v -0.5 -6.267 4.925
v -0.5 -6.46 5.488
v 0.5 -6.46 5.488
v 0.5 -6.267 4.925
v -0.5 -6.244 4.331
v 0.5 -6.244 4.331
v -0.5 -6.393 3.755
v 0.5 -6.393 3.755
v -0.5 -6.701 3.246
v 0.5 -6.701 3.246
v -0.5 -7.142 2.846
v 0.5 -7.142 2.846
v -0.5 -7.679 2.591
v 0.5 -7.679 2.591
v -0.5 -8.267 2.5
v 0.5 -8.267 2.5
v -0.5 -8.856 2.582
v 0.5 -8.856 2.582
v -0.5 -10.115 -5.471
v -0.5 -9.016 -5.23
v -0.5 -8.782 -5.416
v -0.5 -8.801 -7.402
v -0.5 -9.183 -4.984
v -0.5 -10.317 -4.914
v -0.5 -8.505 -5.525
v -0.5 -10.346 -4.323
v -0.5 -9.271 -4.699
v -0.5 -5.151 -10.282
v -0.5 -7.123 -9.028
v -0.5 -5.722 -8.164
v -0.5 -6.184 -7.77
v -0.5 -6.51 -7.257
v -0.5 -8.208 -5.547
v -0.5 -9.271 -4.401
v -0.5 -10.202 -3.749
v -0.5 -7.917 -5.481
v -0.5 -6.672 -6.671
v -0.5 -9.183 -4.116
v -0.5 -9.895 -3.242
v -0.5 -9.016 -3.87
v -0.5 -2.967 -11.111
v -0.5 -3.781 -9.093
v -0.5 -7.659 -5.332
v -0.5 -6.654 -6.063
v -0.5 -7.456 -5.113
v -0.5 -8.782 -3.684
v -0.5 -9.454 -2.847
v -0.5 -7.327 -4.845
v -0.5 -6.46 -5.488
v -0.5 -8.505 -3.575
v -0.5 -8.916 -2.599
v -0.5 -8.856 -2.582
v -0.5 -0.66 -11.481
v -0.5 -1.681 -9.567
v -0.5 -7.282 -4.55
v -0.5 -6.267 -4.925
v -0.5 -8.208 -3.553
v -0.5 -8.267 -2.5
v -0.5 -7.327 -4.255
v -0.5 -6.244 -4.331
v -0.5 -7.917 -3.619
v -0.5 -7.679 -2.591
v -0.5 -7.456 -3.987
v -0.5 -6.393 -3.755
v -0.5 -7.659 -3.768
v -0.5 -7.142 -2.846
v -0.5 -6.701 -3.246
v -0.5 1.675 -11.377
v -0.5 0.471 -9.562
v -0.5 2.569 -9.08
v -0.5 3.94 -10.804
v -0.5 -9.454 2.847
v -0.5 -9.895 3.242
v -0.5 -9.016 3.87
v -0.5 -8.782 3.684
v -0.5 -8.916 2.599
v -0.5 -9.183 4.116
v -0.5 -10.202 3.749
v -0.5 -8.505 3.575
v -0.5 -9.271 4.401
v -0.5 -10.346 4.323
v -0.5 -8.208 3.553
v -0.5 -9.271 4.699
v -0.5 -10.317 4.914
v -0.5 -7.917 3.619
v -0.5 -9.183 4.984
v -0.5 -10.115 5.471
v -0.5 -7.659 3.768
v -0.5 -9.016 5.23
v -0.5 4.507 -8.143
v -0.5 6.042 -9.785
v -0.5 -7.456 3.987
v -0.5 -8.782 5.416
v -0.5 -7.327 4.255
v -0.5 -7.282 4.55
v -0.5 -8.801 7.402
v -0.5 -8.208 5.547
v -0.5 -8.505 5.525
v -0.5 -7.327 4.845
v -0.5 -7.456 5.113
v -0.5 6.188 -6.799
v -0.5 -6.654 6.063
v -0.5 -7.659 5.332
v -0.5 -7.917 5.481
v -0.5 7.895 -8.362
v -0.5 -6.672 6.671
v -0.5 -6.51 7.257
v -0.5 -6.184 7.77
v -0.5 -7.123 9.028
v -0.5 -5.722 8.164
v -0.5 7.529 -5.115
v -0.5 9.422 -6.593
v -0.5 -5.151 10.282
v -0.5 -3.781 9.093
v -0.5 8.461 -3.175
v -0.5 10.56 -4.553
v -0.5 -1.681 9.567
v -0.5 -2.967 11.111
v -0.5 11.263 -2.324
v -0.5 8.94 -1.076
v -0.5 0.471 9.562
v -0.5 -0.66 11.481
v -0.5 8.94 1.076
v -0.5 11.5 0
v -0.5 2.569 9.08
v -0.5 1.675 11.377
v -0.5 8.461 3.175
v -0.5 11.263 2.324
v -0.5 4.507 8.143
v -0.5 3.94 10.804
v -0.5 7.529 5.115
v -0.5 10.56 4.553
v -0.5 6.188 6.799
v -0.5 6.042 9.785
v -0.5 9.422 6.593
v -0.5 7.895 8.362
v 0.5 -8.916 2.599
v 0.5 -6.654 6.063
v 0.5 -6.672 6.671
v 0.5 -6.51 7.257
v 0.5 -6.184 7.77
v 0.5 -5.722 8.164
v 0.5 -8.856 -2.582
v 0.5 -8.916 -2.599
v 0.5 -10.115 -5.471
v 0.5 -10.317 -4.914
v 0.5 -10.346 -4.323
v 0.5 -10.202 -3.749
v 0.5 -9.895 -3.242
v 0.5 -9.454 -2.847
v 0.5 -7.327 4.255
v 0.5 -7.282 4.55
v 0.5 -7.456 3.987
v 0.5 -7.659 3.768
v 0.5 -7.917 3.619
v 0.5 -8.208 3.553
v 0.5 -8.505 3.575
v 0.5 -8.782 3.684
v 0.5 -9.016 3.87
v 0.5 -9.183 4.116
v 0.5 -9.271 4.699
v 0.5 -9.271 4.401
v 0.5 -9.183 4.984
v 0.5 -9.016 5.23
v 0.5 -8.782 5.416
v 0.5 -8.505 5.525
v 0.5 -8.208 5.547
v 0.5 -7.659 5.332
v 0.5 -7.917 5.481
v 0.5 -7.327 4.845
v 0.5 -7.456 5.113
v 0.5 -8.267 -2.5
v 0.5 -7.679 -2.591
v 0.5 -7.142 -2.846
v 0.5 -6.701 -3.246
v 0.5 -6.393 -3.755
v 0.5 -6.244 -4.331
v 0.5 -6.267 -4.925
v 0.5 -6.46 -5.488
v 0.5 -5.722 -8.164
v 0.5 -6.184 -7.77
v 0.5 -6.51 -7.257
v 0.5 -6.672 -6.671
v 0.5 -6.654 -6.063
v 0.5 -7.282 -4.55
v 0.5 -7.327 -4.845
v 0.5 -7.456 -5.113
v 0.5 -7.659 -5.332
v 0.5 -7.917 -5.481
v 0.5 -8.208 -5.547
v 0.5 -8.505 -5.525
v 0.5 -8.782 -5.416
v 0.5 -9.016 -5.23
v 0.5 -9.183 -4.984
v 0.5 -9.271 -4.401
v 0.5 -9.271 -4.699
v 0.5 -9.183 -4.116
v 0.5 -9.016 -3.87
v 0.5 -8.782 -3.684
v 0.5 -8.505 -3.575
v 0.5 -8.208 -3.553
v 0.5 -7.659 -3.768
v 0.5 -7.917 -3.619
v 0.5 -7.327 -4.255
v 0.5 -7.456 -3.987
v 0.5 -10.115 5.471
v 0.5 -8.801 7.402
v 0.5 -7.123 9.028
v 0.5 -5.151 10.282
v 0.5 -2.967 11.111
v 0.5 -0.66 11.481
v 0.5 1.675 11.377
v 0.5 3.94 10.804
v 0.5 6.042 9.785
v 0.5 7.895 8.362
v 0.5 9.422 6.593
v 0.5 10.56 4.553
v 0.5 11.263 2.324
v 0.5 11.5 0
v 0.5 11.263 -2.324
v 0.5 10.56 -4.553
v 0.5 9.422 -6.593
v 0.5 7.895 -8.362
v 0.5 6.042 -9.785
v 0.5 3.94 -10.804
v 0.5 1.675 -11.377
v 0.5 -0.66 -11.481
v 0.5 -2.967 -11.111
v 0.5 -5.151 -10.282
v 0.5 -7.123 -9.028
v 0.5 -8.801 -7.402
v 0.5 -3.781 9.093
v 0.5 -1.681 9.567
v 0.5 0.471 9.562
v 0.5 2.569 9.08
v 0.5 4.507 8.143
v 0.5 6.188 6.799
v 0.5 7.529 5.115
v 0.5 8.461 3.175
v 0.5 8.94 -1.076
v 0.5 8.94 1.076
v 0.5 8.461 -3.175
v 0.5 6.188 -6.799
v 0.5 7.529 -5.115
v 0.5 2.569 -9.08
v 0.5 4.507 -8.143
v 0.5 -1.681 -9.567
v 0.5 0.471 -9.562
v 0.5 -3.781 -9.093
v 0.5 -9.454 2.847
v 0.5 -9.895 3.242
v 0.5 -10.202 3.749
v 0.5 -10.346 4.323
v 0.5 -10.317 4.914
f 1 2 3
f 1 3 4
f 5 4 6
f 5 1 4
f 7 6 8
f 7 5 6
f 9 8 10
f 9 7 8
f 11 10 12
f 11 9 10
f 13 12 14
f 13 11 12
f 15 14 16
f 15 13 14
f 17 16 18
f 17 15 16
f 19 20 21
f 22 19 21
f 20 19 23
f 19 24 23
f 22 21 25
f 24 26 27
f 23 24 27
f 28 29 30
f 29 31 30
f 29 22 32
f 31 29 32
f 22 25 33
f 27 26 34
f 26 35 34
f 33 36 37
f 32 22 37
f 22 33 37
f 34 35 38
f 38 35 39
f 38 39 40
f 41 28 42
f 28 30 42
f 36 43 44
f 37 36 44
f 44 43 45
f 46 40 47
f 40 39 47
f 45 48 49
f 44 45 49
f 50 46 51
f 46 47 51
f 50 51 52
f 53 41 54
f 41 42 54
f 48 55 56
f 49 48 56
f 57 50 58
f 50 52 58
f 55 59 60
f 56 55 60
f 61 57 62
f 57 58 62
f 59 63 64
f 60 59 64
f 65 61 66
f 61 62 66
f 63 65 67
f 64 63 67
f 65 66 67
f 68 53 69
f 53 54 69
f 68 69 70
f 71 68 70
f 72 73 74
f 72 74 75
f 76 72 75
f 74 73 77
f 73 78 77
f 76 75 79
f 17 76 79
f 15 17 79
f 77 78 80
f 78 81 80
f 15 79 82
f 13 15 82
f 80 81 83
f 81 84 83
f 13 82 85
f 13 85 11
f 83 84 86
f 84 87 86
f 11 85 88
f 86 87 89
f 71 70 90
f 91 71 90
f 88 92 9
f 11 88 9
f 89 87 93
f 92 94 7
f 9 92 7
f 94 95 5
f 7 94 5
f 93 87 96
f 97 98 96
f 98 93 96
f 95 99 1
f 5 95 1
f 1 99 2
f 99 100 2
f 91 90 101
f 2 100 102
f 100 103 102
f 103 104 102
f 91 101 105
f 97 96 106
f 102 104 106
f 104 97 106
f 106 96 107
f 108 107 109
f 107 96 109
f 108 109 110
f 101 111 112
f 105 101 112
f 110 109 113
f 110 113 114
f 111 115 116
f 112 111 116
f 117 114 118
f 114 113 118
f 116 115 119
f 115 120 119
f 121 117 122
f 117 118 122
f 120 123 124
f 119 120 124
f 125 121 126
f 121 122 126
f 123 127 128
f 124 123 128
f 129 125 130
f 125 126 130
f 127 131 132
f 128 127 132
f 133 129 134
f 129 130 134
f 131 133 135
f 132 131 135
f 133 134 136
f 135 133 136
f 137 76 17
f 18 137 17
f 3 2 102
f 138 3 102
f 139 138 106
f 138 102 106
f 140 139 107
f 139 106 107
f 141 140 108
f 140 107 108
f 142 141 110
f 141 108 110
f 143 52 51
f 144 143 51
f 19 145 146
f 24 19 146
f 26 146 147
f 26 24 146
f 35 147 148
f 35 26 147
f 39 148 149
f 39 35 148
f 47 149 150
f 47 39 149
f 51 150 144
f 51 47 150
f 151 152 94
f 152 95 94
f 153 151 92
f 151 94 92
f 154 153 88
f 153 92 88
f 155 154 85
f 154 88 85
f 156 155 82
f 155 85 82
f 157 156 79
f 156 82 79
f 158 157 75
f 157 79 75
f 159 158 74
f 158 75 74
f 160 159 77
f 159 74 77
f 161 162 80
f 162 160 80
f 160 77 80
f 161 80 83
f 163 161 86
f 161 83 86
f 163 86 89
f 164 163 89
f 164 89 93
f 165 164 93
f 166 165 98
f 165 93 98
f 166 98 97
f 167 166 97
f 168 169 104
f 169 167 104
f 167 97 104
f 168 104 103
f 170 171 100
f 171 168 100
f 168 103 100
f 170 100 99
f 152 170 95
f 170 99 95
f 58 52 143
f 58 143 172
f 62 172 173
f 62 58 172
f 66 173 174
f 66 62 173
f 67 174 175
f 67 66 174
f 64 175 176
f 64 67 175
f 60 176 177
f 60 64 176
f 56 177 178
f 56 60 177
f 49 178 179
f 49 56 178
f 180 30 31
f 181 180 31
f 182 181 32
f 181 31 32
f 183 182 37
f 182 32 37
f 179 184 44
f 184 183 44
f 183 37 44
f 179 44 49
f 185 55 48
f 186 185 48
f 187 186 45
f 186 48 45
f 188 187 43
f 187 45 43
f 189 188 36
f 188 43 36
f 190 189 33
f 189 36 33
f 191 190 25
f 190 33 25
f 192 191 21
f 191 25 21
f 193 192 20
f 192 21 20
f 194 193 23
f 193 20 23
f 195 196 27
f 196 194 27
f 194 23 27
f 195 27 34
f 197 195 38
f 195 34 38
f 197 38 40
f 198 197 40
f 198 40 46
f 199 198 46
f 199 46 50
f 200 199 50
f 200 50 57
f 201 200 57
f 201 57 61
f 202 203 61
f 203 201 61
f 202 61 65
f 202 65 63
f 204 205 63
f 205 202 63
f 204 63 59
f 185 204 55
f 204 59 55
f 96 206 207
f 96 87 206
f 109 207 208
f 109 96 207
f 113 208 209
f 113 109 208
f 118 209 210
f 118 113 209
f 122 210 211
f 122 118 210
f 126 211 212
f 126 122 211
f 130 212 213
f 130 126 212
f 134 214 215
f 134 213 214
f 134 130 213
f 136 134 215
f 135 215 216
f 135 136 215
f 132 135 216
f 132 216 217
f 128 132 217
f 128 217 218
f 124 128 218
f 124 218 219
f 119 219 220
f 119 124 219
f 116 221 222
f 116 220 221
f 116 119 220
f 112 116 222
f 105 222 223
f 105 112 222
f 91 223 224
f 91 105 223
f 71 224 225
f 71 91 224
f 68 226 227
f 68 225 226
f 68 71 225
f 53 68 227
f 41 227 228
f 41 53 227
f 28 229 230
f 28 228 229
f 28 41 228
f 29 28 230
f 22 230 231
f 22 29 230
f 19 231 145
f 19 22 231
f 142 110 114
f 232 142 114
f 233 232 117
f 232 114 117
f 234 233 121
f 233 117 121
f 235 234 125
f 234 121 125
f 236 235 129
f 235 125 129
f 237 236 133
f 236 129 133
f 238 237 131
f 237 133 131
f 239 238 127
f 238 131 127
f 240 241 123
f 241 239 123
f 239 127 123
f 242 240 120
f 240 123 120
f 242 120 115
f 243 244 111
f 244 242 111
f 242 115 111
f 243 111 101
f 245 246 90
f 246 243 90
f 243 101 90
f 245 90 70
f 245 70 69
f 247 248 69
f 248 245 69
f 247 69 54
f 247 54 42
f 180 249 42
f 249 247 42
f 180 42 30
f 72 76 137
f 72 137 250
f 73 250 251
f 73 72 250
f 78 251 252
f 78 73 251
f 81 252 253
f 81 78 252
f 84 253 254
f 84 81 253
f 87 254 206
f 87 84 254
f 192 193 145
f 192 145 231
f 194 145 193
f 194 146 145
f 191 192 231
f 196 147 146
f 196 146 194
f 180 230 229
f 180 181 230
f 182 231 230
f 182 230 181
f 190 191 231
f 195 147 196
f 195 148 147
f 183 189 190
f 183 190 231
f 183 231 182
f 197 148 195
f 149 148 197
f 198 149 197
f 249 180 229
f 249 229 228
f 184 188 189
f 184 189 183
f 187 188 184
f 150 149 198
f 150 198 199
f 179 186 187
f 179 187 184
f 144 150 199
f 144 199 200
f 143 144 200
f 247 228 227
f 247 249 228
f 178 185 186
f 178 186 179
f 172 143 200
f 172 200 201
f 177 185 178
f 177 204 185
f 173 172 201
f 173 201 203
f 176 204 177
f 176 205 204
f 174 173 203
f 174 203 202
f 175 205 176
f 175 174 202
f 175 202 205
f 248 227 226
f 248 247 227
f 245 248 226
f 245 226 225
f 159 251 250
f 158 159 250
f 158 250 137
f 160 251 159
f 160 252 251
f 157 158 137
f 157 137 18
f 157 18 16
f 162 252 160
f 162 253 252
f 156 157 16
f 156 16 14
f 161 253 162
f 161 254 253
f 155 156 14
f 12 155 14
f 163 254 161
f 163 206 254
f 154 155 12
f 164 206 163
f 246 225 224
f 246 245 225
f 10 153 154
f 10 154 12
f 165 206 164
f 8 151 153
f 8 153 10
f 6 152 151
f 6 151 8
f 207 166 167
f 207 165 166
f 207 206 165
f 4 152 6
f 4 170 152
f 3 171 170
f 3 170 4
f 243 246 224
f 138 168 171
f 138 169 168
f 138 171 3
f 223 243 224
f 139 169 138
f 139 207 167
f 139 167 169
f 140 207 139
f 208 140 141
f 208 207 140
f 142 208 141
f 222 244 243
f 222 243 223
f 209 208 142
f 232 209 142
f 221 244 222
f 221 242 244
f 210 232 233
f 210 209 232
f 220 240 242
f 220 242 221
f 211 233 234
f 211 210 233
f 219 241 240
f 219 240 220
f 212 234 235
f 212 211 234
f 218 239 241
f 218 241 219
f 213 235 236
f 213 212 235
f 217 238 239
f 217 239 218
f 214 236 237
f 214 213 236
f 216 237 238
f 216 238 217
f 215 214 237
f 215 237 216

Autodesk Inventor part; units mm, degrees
sketch "Sketch_3" plane through (0, 0, 0) normal (1, 0, 0) x (0, 1, 0)
  arc A0 (-10.1153, -5.4708) -> (-10.1153, 5.4708) centre (0, 0) ccw
  arc A1 (-10.1153, 5.4708) -> (-8.9159, 2.5993) centre (-8.3561, 4.5194) ccw
  line L0 (-8.9159, 2.5993) -> (-8.8563, 2.5819)
  arc A2 (-8.8563, 2.5819) -> (-6.4596, 5.4878) centre (-8.2825, 4.55) ccw
  arc A3 (-5.7223, 8.1644) -> (-6.4596, 5.4878) centre (-4.6366, 6.4255) ccw
  arc A4 (-5.7223, -8.1644) -> (-5.7223, 8.1644) centre (-0.625, 0) ccw
  arc A5 (-6.4596, -5.4878) -> (-5.7223, -8.1644) centre (-4.6366, -6.4255) ccw
  arc A6 (-6.4596, -5.4878) -> (-8.8563, -2.5819) centre (-8.2825, -4.55) ccw
  line L1 (-8.8563, -2.5819) -> (-8.9159, -2.5993)
  arc A7 (-8.9159, -2.5993) -> (-10.1153, -5.4708) centre (-8.3561, -4.5194) ccw
  circle A8 centre (-8.2825, -4.55) radius 1
  circle A9 centre (-8.2825, 4.55) radius 1
extrude "Extrusion1" add sketch "Sketch_3" along normal mid plane 1
ref_plane "rr_XY" through (-0.5, 0, 0) normal (1, 0, 0) x (0, 0, -1)
ref_plane "rr_YZ" through (-0.5, 0, 0) normal (0, 0, -1) x (0, 1, 0)
ref_plane "rr_ZX" through (-0.5, 0, 0) normal (0, 1, 0) x (1, 0, 0)
properties part number "RRING-C-INT-S-22"
